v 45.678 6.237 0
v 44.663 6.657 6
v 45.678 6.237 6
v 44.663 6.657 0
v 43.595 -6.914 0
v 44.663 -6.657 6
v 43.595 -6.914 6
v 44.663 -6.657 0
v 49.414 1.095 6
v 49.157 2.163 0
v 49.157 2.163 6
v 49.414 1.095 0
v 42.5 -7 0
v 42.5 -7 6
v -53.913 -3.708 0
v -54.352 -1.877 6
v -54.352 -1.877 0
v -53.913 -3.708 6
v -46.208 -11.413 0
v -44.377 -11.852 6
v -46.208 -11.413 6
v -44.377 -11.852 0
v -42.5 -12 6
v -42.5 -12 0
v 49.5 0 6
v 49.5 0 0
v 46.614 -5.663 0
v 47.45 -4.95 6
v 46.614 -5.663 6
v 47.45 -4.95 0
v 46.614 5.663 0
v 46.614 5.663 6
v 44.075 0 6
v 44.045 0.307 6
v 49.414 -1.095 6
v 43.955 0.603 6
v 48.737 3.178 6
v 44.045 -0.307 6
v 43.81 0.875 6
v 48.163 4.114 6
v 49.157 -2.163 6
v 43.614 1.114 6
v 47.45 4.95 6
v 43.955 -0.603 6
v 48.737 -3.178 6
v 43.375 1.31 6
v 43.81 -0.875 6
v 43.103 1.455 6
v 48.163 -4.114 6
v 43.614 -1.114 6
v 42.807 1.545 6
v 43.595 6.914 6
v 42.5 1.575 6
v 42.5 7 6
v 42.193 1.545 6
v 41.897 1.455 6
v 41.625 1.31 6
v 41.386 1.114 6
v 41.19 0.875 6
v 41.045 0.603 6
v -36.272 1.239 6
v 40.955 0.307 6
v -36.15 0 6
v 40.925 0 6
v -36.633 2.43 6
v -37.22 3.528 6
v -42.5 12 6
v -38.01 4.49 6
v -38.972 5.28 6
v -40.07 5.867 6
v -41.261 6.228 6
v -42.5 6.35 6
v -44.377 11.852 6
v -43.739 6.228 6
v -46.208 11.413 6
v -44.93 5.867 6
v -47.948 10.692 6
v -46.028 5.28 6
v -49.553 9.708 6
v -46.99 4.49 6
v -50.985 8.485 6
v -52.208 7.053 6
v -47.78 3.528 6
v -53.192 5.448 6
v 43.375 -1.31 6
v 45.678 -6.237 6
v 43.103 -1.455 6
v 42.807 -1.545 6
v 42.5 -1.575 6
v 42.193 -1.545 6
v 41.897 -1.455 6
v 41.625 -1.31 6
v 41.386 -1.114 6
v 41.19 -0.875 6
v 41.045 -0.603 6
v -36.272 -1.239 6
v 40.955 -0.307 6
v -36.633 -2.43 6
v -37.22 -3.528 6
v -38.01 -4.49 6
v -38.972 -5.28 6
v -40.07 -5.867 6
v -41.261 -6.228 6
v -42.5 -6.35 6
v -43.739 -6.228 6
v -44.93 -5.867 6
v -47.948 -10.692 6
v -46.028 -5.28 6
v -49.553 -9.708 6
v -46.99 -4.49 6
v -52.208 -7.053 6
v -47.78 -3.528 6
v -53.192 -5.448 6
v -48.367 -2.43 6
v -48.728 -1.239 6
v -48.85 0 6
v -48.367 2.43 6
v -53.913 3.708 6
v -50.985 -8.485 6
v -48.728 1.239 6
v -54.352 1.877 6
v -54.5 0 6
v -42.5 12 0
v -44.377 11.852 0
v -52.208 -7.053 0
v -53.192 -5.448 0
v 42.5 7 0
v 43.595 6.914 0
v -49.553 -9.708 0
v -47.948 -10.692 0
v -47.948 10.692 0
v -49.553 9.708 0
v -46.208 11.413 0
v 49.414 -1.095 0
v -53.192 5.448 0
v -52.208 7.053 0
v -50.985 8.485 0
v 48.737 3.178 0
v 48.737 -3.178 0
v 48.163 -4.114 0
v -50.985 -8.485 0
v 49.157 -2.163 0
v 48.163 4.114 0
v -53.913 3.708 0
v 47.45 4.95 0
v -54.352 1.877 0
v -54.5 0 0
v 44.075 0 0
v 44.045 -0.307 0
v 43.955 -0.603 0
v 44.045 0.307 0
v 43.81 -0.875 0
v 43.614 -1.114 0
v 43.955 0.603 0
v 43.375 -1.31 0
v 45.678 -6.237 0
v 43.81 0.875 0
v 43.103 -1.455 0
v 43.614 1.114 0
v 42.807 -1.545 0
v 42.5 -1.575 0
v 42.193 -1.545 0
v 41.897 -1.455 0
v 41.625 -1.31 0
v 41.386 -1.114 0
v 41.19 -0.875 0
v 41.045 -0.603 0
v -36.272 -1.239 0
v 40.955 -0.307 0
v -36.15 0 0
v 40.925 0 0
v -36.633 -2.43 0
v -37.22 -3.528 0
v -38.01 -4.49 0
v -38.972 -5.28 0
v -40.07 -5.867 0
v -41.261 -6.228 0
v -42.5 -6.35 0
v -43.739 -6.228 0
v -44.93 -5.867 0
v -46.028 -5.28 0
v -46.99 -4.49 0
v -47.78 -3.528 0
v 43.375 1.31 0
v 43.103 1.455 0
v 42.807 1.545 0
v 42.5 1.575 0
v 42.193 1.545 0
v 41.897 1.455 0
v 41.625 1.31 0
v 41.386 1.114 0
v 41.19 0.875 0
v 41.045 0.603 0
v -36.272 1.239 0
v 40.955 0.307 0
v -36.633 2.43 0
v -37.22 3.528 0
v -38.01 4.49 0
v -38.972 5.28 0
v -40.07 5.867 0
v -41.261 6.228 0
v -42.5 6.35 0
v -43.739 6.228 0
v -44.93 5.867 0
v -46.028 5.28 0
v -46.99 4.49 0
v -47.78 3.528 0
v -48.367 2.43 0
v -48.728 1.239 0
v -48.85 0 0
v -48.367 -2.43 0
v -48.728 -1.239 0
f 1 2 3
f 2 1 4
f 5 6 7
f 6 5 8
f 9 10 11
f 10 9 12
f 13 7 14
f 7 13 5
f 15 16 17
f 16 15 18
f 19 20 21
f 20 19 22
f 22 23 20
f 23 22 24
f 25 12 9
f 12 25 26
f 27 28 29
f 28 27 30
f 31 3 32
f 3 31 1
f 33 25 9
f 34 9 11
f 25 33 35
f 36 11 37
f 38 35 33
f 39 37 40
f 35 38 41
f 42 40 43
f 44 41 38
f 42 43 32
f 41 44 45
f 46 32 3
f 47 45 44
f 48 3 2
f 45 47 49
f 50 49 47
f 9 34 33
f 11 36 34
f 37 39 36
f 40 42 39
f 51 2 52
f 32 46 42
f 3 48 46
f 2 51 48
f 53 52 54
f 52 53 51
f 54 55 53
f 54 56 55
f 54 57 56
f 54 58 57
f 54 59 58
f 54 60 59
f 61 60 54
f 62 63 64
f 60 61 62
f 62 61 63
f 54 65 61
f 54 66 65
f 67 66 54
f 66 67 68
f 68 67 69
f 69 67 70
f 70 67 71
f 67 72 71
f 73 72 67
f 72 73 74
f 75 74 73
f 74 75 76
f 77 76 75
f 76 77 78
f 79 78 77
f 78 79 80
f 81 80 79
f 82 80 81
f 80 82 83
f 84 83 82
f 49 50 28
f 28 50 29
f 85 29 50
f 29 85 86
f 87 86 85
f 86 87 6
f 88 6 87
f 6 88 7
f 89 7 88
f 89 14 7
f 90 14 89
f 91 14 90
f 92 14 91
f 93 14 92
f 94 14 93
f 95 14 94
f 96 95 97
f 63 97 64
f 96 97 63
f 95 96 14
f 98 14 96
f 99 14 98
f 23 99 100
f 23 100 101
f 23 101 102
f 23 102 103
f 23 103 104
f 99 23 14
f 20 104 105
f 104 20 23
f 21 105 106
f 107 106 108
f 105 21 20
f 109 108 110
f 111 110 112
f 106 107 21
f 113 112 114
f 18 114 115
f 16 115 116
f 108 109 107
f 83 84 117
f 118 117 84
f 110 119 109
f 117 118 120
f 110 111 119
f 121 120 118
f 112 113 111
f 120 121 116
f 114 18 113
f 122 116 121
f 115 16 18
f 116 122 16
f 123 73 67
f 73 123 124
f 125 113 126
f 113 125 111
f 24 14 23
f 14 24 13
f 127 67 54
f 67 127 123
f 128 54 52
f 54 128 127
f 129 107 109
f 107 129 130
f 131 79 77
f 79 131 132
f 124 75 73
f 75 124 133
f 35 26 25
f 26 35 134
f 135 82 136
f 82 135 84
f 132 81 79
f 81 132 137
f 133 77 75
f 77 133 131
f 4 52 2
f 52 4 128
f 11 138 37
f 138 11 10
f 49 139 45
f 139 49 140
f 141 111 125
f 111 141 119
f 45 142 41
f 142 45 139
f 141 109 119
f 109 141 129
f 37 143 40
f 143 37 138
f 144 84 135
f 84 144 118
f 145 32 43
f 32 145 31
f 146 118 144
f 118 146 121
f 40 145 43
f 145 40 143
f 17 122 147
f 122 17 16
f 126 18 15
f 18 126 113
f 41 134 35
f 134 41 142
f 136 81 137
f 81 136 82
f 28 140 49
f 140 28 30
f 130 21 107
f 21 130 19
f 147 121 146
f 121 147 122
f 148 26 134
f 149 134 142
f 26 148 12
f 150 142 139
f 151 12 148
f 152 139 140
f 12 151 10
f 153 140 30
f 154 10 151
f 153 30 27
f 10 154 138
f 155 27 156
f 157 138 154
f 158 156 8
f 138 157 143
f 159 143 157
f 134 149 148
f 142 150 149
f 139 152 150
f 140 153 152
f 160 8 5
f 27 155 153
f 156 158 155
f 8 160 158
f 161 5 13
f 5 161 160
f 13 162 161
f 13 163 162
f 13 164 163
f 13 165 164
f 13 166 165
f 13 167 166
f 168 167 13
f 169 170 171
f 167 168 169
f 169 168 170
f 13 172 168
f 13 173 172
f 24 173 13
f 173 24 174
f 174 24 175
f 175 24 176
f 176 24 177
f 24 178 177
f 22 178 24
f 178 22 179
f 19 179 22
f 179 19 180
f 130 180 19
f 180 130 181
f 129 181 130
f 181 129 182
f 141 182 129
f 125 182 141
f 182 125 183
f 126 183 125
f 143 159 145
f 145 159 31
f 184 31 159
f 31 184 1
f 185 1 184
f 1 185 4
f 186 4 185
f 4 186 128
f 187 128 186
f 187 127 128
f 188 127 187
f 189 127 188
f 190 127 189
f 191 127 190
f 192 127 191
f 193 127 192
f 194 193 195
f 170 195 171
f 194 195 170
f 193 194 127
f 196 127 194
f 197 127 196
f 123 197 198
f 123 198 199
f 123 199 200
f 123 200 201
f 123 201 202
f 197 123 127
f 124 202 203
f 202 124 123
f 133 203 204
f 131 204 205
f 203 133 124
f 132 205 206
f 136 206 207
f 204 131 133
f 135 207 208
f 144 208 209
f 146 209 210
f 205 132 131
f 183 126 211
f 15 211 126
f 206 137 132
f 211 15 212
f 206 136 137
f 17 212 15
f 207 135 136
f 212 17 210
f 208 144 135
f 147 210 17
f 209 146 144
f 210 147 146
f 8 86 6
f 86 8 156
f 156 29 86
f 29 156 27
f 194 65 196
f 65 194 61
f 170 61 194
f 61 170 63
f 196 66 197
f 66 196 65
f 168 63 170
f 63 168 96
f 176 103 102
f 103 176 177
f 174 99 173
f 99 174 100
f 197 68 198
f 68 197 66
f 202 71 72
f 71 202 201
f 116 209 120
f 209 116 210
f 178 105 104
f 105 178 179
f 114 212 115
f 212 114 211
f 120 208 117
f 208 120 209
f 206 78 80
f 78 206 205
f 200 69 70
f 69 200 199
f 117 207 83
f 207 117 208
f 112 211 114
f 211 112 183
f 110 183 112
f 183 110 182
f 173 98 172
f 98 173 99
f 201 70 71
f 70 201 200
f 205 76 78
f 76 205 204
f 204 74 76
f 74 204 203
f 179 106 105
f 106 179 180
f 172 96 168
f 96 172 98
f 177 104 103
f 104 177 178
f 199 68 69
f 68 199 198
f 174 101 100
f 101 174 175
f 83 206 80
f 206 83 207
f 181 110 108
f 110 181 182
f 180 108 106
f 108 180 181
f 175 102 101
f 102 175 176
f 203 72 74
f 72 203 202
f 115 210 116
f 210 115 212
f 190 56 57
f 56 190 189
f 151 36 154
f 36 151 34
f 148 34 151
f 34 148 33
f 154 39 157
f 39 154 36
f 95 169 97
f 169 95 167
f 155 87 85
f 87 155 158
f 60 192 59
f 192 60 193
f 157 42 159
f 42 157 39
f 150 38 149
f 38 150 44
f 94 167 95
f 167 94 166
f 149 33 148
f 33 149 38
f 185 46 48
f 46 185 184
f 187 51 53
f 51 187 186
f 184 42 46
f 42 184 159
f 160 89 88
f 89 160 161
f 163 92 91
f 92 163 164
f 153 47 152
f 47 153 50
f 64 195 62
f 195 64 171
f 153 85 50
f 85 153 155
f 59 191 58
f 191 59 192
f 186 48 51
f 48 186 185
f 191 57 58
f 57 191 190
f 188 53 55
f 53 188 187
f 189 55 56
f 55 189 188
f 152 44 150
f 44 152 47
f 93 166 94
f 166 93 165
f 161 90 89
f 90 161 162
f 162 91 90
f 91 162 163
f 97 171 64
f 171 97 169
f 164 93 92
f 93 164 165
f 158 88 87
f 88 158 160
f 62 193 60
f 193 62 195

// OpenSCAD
$fn = 32;

// ----------------------------------------------------------------------
// Lever: 85 mm between the bosses, 6 mm thick, smooth outline
// ----------------------------------------------------------------------

// --- parameters (mm) ---
lever_l = 85;             // distance between the boss centres
boss_a = 24;              // first boss diameter
boss_b = 14;              // second boss diameter
bore_a = 12.7;            // first bore
bore_b = 3.15;            // second bore
lever_t = 6;              // lever thickness

lever_profile = [[-54.5, 0], [-54.352, -1.877], [-53.913, -3.708], [-53.192, -5.448], [-52.208, -7.053], [-50.985, -8.485], [-49.553, -9.708], [-47.948, -10.692], [-46.208, -11.413], [-44.377, -11.852], [-42.5, -12], [42.5, -7], [43.595, -6.914], [44.663, -6.657], [45.678, -6.237], [46.614, -5.663], [47.45, -4.95], [48.163, -4.114], [48.737, -3.178], [49.157, -2.163], [49.414, -1.095], [49.5, 0], [49.414, 1.095], [49.157, 2.163], [48.737, 3.178], [48.163, 4.114], [47.45, 4.95], [46.614, 5.663], [45.678, 6.237], [44.663, 6.657], [43.595, 6.914], [42.5, 7], [-42.5, 12], [-44.377, 11.852], [-46.208, 11.413], [-47.948, 10.692], [-49.553, 9.708], [-50.985, 8.485], [-52.208, 7.053], [-53.192, 5.448], [-53.913, 3.708], [-54.352, 1.877]];

difference() {
  linear_extrude(height = lever_t) polygon(lever_profile);
  translate([-42.5, 0, -2.5]) cylinder(h = lever_t + 5, d = bore_a);
  translate([42.5, 0, -2.5]) cylinder(h = lever_t + 5, d = bore_b);
}
